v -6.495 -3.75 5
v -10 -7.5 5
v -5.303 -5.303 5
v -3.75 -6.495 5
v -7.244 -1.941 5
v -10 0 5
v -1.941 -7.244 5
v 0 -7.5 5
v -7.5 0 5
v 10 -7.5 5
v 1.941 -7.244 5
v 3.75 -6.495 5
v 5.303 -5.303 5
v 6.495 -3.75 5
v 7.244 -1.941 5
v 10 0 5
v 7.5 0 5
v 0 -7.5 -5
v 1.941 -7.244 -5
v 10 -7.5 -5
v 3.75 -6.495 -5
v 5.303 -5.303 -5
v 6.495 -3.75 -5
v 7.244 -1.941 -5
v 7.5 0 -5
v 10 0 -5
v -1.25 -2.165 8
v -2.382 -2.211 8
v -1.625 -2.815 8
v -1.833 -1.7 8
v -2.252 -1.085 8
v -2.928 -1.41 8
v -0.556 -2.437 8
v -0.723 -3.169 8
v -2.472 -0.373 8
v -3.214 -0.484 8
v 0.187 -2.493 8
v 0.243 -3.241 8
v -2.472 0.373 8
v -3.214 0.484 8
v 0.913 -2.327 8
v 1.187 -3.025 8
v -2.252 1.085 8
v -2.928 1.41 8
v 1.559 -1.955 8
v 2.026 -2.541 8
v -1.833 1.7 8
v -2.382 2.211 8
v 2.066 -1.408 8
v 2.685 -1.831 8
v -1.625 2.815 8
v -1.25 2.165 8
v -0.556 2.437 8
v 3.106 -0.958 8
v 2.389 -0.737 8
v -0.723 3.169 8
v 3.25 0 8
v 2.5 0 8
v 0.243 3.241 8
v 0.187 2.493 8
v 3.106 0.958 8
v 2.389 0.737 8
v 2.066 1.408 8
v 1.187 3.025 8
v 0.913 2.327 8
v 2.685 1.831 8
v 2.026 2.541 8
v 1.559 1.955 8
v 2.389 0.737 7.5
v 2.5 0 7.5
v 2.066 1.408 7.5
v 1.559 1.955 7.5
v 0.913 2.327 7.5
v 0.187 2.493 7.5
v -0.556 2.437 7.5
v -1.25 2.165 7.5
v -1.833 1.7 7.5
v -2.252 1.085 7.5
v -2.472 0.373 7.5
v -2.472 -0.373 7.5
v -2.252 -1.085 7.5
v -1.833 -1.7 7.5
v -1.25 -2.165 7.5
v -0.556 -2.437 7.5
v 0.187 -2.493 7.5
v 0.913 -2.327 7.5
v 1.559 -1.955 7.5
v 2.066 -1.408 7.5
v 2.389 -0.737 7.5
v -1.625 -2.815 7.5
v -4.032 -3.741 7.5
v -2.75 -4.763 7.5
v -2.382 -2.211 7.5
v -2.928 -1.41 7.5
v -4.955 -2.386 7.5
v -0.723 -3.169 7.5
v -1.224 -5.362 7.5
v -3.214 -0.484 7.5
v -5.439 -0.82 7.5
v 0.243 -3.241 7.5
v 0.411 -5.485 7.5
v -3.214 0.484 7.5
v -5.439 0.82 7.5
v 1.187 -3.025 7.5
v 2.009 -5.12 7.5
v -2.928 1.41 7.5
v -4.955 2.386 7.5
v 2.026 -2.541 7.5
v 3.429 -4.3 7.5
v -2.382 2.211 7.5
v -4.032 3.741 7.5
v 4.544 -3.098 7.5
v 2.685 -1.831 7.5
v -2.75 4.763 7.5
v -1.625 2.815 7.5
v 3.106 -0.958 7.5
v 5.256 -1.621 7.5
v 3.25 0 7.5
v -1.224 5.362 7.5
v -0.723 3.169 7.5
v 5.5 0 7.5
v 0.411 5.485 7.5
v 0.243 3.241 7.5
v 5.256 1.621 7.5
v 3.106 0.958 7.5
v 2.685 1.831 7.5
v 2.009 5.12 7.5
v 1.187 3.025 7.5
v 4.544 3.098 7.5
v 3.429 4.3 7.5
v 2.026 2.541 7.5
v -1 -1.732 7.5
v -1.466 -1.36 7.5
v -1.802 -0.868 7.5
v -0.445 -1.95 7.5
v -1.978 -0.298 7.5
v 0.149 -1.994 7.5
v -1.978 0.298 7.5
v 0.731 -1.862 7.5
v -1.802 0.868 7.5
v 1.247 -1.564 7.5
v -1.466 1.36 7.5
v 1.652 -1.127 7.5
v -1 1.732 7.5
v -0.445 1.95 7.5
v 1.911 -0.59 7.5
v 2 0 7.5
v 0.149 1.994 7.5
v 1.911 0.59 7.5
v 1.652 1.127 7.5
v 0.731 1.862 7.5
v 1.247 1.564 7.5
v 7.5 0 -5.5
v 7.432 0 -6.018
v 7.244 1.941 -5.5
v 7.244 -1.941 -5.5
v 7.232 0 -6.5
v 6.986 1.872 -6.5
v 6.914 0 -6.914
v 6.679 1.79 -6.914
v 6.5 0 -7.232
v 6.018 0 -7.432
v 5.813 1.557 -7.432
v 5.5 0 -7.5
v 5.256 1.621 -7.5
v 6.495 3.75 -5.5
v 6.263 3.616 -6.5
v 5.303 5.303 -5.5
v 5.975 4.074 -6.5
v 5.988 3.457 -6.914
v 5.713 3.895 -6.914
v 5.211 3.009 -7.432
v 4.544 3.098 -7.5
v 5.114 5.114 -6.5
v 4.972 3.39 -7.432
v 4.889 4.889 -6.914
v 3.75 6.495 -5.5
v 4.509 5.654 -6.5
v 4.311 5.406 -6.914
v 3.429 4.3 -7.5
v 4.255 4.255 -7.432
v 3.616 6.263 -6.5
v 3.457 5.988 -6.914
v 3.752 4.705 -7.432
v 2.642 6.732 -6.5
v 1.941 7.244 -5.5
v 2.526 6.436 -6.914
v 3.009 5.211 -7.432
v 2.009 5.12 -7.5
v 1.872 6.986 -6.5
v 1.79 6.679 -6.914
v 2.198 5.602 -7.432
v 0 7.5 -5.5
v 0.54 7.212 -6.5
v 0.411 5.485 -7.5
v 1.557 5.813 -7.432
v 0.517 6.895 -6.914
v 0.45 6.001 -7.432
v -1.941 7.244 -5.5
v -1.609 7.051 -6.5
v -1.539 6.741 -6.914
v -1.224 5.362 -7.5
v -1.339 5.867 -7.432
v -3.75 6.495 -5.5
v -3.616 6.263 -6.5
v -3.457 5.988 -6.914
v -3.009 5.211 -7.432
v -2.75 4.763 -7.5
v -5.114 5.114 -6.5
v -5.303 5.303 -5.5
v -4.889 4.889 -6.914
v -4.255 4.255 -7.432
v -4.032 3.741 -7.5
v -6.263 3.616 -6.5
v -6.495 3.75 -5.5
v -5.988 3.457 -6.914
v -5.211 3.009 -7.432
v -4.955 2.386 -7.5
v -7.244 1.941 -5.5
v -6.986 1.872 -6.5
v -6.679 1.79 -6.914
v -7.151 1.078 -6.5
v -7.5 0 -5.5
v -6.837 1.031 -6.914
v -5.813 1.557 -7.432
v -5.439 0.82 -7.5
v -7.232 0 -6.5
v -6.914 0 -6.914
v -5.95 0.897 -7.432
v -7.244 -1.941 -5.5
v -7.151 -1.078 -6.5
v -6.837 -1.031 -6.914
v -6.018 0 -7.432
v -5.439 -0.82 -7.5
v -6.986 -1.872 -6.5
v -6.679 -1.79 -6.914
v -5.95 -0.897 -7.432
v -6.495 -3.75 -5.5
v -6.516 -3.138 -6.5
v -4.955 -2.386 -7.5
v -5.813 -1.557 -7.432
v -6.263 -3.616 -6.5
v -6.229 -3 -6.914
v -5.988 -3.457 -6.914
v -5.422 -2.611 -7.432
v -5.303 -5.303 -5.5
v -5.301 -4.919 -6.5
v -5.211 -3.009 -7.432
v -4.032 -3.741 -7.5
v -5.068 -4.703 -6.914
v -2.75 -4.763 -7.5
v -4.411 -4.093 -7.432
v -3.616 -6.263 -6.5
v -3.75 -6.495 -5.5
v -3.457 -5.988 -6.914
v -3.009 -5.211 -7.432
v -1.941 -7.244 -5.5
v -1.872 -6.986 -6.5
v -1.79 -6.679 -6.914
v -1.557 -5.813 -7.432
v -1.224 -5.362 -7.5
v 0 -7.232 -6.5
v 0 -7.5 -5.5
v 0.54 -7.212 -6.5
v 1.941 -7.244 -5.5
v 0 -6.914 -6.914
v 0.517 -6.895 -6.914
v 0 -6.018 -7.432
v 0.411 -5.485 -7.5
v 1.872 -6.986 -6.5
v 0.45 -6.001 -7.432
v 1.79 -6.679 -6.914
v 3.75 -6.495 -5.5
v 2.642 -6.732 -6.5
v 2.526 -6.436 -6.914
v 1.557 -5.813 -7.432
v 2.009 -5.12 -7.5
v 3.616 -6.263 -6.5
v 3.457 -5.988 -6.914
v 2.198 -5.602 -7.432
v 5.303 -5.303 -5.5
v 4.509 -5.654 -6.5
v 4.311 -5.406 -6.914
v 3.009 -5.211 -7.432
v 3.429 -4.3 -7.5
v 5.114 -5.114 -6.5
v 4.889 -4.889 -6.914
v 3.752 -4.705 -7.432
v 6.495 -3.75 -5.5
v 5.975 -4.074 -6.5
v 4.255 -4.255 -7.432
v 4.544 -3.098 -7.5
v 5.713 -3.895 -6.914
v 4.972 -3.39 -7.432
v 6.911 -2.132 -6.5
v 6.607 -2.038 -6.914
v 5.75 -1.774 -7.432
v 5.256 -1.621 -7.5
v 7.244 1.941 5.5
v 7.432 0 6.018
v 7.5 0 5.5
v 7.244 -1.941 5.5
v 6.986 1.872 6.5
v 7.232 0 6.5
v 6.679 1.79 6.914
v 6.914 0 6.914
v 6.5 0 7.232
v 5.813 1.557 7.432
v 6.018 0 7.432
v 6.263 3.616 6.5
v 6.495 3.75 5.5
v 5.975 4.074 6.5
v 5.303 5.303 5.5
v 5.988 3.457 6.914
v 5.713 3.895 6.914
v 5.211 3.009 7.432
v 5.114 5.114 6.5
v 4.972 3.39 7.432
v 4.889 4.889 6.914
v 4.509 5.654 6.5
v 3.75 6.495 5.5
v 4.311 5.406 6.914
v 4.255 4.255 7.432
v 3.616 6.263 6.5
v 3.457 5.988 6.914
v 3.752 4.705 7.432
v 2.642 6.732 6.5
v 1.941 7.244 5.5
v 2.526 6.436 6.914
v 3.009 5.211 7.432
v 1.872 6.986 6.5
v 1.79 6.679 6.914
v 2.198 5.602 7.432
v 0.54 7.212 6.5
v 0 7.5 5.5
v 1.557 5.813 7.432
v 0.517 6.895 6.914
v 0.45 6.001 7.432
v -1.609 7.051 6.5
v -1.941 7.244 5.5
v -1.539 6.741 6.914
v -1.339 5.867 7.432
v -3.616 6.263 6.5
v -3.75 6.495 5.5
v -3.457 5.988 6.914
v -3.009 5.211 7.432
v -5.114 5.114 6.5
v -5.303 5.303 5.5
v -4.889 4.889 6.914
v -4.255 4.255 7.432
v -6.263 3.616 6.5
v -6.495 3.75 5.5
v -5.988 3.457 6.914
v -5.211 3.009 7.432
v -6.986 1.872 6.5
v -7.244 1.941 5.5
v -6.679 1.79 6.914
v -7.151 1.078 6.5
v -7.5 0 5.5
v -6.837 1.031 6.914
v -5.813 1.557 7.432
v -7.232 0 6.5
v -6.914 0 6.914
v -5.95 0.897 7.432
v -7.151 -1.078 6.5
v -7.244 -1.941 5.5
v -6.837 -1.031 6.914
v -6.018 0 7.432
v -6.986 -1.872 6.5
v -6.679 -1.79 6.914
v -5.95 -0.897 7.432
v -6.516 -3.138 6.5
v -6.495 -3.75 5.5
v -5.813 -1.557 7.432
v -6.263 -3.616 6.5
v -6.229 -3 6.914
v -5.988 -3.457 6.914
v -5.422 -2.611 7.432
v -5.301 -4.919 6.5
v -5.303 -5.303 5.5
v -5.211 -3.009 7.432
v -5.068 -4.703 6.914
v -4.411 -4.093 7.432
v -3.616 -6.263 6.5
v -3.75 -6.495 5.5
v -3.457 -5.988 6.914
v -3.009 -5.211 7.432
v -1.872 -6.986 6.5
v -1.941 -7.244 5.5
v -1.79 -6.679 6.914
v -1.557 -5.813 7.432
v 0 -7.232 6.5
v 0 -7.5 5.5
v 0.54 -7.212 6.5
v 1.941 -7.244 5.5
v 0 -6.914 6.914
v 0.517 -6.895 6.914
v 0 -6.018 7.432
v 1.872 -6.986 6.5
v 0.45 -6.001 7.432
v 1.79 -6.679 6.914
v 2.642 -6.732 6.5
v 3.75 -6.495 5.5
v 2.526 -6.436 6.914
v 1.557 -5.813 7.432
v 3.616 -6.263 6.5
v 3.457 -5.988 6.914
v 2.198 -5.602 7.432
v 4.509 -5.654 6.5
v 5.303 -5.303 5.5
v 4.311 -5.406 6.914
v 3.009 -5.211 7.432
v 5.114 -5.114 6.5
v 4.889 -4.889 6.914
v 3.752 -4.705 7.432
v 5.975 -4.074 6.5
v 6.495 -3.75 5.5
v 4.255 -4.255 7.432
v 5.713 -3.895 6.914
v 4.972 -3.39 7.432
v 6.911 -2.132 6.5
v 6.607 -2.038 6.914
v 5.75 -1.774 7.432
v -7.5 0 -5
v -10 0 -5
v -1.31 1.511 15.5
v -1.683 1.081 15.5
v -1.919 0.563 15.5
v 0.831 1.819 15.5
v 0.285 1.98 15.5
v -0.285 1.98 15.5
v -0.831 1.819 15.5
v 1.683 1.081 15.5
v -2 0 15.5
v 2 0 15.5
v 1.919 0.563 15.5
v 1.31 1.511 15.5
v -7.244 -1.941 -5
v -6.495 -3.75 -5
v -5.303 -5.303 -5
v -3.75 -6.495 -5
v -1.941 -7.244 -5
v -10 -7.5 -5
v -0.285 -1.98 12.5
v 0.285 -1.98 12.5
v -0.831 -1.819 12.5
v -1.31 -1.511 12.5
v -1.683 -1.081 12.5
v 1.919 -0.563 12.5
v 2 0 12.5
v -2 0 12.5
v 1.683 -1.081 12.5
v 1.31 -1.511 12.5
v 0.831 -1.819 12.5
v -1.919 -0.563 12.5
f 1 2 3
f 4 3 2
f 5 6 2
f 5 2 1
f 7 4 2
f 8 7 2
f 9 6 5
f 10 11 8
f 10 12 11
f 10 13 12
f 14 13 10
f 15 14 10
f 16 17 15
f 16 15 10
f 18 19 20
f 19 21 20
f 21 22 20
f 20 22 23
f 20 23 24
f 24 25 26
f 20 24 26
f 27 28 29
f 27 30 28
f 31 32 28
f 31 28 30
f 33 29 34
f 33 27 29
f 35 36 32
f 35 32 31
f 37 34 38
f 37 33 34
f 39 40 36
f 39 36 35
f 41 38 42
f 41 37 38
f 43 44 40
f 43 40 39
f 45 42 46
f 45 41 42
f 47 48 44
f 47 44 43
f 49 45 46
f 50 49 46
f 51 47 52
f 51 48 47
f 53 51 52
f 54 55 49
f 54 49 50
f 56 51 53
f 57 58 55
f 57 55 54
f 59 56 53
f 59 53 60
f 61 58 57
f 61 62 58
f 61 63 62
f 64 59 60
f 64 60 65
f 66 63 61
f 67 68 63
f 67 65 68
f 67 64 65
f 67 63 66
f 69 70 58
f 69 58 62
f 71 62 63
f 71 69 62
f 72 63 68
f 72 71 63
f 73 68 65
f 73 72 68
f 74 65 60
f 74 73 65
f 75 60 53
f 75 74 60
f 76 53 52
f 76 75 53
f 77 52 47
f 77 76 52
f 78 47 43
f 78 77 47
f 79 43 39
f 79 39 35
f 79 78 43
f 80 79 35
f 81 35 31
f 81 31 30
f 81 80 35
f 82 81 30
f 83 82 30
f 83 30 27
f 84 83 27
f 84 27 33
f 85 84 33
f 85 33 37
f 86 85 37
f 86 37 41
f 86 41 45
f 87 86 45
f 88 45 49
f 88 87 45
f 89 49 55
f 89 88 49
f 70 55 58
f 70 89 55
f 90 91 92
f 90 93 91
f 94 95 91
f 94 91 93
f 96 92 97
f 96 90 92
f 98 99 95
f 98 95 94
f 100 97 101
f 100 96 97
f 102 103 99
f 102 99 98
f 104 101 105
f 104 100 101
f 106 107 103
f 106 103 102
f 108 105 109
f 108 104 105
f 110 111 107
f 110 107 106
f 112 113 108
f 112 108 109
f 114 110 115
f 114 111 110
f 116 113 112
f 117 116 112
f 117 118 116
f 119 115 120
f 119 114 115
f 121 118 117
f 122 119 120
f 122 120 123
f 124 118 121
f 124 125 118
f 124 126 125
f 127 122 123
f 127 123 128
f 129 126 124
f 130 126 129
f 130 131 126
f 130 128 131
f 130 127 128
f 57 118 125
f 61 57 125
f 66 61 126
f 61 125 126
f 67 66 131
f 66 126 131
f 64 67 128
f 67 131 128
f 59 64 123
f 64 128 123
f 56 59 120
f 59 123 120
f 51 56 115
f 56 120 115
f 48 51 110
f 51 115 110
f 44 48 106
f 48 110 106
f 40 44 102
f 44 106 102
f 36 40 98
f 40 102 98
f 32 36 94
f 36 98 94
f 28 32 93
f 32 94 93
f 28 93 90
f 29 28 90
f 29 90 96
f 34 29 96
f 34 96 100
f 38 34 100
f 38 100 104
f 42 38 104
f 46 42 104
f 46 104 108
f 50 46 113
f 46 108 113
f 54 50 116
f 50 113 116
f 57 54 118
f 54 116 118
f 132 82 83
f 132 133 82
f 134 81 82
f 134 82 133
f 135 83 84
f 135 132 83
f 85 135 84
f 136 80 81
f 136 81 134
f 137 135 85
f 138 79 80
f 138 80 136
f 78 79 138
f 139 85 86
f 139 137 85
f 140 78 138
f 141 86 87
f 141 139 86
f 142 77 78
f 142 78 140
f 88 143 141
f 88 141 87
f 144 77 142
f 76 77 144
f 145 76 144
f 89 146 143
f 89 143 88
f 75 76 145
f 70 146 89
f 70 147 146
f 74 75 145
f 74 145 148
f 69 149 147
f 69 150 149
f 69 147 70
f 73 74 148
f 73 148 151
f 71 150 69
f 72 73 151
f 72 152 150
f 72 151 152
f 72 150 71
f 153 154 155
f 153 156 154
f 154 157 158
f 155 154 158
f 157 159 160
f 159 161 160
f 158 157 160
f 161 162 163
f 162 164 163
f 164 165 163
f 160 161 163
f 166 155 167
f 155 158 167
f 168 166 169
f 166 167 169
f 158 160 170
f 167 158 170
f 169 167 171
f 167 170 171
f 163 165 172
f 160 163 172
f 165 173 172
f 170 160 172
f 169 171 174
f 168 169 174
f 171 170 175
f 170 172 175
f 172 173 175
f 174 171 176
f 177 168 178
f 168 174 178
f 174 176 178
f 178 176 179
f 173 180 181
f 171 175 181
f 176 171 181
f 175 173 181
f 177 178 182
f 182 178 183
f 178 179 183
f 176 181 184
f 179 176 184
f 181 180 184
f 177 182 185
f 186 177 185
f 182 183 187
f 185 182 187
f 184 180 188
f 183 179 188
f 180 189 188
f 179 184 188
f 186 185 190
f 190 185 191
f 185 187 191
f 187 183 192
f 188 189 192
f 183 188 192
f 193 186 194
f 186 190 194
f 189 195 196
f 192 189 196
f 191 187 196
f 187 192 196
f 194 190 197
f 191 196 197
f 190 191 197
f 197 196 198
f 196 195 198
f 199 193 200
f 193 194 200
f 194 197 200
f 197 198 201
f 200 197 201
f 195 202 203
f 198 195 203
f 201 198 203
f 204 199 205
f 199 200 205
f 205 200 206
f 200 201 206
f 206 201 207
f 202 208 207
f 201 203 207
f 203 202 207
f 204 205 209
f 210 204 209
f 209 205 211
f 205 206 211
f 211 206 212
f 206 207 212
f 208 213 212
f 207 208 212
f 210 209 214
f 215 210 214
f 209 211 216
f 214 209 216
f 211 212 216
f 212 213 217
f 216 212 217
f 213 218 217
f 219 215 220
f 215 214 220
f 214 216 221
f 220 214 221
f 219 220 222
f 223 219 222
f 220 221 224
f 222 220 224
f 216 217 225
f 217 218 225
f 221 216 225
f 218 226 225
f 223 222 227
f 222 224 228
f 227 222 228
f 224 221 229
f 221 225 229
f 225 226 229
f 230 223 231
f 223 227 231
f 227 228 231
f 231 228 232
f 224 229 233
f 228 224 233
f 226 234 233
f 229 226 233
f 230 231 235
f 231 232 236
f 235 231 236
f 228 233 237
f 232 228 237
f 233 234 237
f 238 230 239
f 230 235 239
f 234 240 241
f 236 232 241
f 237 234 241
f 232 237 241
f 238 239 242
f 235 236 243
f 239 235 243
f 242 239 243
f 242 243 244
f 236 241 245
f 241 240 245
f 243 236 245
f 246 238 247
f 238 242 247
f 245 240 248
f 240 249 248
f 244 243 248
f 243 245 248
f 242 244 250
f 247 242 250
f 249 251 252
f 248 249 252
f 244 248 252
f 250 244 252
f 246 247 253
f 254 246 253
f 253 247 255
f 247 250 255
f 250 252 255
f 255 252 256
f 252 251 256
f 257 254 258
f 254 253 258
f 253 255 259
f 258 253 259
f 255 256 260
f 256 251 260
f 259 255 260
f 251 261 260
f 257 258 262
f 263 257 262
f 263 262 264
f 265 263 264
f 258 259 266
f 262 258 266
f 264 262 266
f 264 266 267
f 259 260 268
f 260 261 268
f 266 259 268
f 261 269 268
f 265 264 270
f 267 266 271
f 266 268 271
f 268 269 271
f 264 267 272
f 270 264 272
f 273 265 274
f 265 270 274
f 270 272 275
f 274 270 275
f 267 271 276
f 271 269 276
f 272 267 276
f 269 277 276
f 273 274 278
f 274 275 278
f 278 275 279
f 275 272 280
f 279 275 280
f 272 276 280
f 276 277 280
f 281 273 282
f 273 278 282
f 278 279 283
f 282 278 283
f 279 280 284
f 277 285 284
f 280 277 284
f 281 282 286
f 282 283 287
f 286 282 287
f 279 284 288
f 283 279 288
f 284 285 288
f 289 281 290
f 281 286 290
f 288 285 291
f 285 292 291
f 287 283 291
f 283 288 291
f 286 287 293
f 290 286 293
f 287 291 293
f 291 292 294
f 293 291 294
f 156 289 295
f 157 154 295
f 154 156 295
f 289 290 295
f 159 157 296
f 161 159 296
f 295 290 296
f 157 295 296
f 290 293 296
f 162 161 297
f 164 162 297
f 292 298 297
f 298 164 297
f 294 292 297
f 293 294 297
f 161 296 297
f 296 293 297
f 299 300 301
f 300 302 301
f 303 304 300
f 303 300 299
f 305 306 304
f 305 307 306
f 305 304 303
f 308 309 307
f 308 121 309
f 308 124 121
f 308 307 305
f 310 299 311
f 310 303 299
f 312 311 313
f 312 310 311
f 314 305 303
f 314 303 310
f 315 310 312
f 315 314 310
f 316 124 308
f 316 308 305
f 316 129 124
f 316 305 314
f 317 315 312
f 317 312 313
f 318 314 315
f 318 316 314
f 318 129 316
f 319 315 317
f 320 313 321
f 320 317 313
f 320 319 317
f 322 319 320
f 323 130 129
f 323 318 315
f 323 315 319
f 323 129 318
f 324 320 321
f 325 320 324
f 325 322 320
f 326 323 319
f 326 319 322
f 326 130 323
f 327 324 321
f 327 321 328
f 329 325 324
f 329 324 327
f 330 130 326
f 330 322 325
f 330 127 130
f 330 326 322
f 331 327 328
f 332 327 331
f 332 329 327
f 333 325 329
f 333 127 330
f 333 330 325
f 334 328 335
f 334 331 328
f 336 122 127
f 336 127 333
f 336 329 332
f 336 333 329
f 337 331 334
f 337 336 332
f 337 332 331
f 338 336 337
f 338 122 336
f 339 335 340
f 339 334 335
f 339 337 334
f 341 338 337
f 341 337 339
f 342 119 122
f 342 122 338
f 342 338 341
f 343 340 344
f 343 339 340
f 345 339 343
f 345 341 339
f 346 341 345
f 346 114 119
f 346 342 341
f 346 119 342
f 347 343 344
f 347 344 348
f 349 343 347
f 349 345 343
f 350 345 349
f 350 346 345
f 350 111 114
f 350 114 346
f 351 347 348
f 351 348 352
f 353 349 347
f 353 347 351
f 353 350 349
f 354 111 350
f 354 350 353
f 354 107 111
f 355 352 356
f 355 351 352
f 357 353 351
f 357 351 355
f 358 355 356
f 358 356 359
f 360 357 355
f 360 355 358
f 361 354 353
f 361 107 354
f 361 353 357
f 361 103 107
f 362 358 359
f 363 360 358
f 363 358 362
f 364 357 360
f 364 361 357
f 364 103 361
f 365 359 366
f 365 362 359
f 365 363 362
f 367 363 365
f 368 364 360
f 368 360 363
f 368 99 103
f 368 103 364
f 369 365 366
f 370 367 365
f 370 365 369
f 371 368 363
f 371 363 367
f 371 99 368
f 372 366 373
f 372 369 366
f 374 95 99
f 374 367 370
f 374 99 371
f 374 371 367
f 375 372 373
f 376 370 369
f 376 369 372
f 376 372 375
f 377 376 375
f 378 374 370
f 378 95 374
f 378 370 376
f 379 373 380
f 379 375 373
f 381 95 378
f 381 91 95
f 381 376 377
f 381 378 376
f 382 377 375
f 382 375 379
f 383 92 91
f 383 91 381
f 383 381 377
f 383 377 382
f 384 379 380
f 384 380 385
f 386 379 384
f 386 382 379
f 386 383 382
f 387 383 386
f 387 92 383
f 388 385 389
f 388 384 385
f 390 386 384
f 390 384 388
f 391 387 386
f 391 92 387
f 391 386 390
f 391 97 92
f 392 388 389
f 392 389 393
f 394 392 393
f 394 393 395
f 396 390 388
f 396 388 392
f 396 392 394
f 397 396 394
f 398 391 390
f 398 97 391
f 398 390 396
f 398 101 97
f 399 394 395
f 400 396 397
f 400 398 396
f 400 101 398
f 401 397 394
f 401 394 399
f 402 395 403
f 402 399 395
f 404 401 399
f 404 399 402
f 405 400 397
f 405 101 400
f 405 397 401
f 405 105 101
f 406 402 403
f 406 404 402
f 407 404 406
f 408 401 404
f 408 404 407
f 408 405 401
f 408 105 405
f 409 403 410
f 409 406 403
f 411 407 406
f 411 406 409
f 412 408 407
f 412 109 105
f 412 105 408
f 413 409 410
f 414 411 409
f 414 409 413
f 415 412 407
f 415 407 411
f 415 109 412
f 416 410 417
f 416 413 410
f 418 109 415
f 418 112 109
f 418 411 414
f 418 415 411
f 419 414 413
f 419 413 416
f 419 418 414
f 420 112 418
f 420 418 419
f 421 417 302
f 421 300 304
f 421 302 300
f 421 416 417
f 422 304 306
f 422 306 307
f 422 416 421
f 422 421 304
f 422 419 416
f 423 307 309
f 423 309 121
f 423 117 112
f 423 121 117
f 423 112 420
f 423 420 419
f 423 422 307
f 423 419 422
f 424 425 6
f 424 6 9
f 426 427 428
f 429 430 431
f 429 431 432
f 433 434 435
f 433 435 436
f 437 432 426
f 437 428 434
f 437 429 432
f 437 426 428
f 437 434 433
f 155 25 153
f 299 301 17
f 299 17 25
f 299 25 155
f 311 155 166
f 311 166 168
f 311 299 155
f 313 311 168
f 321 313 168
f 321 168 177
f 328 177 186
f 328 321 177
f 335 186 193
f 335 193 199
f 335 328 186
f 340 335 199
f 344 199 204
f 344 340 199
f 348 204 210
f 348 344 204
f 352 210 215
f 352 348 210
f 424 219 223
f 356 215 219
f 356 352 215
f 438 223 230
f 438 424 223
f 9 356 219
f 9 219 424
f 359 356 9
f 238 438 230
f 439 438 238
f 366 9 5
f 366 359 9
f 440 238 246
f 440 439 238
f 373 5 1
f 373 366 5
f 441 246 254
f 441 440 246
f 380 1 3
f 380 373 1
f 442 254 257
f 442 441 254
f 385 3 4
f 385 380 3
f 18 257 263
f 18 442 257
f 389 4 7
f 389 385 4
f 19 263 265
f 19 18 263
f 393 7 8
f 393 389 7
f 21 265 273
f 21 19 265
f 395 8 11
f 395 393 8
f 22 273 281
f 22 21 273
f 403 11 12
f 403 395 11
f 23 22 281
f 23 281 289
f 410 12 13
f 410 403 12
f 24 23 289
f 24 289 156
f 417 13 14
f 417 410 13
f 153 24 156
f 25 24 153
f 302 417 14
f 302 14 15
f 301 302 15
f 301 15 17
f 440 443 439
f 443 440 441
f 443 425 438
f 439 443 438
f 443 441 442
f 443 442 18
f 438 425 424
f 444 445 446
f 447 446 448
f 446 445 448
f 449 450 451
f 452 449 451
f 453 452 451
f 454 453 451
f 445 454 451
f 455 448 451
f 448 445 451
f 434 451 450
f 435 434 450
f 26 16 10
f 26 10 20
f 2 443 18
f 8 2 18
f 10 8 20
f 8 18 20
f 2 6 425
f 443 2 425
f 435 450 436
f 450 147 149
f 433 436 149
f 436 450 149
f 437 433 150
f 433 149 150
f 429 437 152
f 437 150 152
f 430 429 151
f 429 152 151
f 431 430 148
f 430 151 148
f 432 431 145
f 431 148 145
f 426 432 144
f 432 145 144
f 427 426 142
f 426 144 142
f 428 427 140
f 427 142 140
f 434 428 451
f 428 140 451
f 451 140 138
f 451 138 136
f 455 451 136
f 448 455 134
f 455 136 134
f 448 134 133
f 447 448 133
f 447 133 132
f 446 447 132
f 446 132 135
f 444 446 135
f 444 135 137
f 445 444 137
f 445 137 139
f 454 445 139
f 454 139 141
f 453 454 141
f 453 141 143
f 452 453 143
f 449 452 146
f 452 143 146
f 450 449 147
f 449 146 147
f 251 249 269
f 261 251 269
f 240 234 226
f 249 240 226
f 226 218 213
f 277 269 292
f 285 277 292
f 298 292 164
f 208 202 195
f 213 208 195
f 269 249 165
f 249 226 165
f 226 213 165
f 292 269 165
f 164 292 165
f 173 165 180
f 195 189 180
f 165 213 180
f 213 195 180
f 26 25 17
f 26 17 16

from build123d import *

# Parameters (mm, degrees)
SKETCH1_R           = 7.5
BOSS_EXTRUDE5_DEPTH = 7.5
SKETCH7_R           = 3.25
SKETCH7_R_2         = 2.5
BOSS_EXTRUDE6_DEPTH = 0.5
SKETCH8_R           = 2
BOSS_EXTRUDE7_DEPTH = 8
CUT_EXTRUDE2_START  = -3
CUT_EXTRUDE2_DEPTH  = 3
SKETCH10_W          = 20
SKETCH10_H          = 10
BOSS_EXTRUDE8_DEPTH = 7.5
FILLET2_R           = 2


with BuildPart() as part:
    # Sketch1 → Boss-Extrude5 (new, symmetric)
    with BuildSketch(Plane.XY):
        Circle(SKETCH1_R)
    extrude(amount=BOSS_EXTRUDE5_DEPTH, both=True)

    # Sketch7 → Boss-Extrude6 (add)
    with BuildSketch(Plane.XY.offset(7.5)):
        Circle(SKETCH7_R)
        Circle(SKETCH7_R_2, mode=Mode.SUBTRACT)
    extrude(amount=BOSS_EXTRUDE6_DEPTH)

    # Sketch8 → Boss-Extrude7 (add)
    with BuildSketch(Plane.XY.offset(7.5)):
        Circle(SKETCH8_R)
    extrude(amount=BOSS_EXTRUDE7_DEPTH)

    # Sketch9 → Cut-Extrude2 (cut)
    with BuildSketch(Plane.XY.offset(15.5).offset(CUT_EXTRUDE2_START)):
        with BuildLine():
            Line((-2, 0), (2, 0))
            ThreePointArc((2, 0), (0, -2), (-2, 0))
        make_face()
    extrude(amount=CUT_EXTRUDE2_DEPTH, mode=Mode.SUBTRACT)

    # Sketch10 → Boss-Extrude8 (add)
    with BuildSketch(Plane(origin=(0, 0, 0), x_dir=(1, 0, 0), z_dir=(0, 1, 0))):
        Rectangle(SKETCH10_W, SKETCH10_H)
    extrude(amount=-BOSS_EXTRUDE8_DEPTH)

    # Fillet2
    fillet2_edges = [part.edges().sort_by_distance(p)[0] for p in [
        (-7.5, 0, -7.5),
        (-7.5, 0, 7.5),
    ]]
    fillet(fillet2_edges, radius=FILLET2_R)


solid = part.part
